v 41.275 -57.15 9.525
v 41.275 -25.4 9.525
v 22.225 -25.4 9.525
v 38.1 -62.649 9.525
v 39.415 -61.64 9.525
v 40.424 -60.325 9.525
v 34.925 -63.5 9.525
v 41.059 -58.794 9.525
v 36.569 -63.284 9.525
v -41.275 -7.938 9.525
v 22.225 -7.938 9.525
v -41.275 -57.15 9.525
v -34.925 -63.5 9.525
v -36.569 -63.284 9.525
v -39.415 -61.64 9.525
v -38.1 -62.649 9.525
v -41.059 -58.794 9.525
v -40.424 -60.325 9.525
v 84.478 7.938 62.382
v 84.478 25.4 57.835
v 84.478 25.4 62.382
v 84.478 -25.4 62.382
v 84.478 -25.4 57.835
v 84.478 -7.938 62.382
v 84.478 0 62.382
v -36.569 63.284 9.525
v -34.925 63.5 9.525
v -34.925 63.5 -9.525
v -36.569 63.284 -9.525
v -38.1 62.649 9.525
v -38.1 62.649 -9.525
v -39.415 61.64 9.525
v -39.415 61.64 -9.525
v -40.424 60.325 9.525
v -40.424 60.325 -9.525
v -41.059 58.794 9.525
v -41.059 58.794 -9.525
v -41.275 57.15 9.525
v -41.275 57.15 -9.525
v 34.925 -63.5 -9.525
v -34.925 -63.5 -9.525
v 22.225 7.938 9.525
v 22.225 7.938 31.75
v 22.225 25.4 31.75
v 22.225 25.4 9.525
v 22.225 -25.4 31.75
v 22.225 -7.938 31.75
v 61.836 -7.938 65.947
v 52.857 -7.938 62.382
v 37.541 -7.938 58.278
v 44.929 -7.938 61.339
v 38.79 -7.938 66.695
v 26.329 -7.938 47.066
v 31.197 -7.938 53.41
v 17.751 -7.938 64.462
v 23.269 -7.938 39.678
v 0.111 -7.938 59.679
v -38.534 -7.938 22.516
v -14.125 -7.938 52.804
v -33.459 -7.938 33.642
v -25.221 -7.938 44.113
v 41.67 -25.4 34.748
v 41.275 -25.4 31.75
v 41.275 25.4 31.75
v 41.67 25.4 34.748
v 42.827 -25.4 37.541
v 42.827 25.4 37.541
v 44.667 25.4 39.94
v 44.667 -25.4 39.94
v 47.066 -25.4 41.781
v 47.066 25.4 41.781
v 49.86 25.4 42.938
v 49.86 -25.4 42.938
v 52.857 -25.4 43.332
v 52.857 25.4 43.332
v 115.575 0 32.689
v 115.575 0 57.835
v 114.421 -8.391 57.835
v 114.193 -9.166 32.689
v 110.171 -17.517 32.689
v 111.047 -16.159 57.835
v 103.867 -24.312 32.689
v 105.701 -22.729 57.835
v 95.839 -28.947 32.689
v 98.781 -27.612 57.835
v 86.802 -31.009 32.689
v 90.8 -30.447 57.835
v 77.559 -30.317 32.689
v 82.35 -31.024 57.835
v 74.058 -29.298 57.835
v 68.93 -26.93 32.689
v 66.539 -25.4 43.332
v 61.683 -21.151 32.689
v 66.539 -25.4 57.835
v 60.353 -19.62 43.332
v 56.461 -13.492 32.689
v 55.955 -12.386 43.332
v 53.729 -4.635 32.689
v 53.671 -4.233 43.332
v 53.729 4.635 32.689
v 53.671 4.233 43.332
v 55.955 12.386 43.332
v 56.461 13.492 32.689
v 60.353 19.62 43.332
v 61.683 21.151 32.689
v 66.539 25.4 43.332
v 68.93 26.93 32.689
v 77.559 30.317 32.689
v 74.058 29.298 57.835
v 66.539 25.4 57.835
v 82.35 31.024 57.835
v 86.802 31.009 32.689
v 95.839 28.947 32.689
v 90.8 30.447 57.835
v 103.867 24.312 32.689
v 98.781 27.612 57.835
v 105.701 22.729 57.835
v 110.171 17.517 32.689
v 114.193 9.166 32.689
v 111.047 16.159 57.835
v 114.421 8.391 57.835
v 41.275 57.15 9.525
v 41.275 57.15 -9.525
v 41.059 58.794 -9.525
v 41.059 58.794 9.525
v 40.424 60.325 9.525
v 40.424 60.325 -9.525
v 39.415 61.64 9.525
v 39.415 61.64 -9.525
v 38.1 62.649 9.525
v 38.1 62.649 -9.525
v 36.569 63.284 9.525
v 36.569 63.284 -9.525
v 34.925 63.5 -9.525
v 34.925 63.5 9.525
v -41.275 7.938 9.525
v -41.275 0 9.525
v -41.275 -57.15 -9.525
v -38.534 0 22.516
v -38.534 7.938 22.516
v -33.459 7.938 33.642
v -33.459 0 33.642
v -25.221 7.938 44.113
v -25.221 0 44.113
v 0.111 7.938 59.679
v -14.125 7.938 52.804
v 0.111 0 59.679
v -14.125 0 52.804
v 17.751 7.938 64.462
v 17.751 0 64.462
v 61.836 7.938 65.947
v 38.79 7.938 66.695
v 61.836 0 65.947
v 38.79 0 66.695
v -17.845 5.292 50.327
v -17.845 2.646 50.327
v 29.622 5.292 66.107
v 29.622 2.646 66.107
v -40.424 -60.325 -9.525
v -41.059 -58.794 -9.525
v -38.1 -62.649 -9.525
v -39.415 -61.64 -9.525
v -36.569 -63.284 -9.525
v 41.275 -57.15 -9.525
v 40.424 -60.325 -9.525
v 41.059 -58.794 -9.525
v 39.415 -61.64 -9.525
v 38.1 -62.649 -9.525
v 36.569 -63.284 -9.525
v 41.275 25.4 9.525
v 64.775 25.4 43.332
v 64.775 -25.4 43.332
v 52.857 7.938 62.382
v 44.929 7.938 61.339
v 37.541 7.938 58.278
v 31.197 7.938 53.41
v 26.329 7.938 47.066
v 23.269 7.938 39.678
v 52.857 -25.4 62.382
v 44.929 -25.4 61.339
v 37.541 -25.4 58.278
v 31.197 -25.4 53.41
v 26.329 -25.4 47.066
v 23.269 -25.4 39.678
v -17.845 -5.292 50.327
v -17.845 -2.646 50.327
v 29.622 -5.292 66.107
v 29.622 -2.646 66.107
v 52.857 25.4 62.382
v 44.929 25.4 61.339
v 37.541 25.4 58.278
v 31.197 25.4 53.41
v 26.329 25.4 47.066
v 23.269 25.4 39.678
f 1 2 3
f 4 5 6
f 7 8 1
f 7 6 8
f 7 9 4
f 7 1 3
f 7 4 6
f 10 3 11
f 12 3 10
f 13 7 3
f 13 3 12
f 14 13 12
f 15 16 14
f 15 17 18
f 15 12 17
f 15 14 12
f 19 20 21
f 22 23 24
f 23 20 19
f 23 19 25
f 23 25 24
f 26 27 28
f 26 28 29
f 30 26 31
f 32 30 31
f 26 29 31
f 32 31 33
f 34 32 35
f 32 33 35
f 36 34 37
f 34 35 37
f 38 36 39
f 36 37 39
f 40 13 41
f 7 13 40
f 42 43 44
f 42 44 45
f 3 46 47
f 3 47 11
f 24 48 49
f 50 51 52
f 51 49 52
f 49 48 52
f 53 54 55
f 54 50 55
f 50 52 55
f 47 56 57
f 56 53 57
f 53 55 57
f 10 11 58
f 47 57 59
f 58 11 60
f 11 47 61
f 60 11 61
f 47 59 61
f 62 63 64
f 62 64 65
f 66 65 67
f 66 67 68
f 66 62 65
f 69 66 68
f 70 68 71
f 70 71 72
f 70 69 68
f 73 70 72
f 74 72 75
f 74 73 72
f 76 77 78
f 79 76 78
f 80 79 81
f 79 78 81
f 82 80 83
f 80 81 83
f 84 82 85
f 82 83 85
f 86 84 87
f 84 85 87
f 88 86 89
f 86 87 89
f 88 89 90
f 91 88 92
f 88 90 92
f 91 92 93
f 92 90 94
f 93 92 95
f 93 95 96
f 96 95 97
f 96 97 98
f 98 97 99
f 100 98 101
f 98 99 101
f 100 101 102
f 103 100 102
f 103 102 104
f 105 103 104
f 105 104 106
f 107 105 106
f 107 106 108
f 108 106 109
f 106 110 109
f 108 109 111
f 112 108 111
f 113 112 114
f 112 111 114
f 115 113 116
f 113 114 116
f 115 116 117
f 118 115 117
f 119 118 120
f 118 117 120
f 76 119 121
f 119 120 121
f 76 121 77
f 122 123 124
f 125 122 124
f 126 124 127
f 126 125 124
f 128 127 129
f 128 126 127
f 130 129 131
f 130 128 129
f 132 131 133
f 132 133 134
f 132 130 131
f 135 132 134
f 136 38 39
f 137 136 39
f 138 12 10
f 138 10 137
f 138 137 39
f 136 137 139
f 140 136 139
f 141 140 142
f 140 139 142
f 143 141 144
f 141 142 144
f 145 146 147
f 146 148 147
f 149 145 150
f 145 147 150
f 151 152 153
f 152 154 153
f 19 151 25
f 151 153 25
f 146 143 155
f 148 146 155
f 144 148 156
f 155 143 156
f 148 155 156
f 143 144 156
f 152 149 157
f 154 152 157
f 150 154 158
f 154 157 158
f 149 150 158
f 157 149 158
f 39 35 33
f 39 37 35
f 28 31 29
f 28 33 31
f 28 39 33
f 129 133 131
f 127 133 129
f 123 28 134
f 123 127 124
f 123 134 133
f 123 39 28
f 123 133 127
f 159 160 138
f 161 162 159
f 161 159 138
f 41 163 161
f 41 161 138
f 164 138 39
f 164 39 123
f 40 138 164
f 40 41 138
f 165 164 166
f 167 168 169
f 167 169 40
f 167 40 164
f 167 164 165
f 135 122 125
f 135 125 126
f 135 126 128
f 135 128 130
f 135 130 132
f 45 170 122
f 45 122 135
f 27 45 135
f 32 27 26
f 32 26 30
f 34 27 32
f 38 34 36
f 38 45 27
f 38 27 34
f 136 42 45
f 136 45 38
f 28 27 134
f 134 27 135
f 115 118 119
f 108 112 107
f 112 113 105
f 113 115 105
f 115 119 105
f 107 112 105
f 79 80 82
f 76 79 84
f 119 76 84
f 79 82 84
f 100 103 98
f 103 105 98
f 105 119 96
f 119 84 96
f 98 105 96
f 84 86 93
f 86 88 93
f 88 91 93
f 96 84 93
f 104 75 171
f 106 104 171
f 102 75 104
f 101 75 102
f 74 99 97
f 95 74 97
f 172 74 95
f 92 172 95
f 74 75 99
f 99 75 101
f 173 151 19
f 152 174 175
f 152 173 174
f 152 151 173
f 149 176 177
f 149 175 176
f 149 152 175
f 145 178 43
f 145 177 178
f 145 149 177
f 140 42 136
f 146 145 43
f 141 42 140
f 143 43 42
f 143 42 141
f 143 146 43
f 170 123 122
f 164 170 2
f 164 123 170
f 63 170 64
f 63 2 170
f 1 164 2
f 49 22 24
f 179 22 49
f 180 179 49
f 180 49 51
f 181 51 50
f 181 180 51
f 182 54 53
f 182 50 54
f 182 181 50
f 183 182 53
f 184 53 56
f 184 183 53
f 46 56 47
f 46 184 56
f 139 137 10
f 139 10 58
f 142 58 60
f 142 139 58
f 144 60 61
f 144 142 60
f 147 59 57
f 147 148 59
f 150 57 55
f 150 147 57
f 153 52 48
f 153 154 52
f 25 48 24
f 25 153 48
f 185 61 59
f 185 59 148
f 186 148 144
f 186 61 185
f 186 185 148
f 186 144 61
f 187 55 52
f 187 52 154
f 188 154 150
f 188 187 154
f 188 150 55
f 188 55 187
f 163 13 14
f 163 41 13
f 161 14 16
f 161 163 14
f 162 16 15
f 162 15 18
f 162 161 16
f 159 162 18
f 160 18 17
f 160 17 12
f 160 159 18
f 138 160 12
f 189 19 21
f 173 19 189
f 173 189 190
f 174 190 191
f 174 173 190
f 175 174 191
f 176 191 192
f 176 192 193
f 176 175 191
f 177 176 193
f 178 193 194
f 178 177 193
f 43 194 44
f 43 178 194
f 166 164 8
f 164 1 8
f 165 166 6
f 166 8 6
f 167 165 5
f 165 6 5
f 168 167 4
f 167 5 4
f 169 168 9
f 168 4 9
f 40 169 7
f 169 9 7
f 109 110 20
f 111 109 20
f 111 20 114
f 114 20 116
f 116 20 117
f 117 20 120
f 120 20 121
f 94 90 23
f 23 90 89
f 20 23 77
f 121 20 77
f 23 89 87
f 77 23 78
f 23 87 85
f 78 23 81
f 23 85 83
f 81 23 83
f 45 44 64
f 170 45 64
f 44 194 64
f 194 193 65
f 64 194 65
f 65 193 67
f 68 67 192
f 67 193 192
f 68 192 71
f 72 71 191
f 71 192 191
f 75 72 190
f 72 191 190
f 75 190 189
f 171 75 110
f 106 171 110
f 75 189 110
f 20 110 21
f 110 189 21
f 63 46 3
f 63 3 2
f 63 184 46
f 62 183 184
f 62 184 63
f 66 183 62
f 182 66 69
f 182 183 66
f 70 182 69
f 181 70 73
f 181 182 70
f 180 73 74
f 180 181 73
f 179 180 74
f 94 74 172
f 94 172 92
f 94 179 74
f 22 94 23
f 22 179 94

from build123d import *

# Parameters (mm, degrees)
F1_DEPTH = 63.5
F0_W     = 19.703557321
F0_H     = 14.5021951942
F2_DEPTH = 25.4
F3_DEPTH = 7.9375
F5_R     = 6.35


with BuildPart() as f1:
    # F0 (on Front) → F1 (new body, symmetric)
    with BuildSketch(Plane.XZ):
        Polygon((-41.275, 9.525), (-41.275, -9.525), (41.275, -9.525), (41.275, 9.525), (22.225, 9.525), align=None)
    extrude(amount=F1_DEPTH, both=True)

    # F0 (on Front) → F2 (join, symmetric)
    with BuildSketch(Plane.XZ):
        with BuildLine():
            Line((22.225, 9.525), (41.275, 9.525))
            Line((41.275, 9.525), (41.275, 31.7500035657))
            ThreePointArc((41.275, 31.7500035657), (44.6674064176, 39.9399971481), (52.8574, 43.3324035657))
            Line((52.8574, 43.3324035657), (64.774647217, 43.3324035657))
            Line((64.774647217, 43.3324035657), (64.774647217, 57.8345987598))
            Line((64.774647217, 57.8345987598), (84.478204538, 57.8345987598))
            Line((84.478204538, 57.8345987598), (84.478204538, 62.3824035657))
            Line((84.478204538, 62.3824035657), (52.8574, 62.3824035657))
            ThreePointArc((52.8574, 62.3824035657), (31.197022236, 53.4103813297), (22.225, 31.7500035657))
            Line((22.225, 31.7500035657), (22.225, 9.525))
        make_face()
        with Locations((74.6264258775, 50.5835011627)):
            Rectangle(F0_W, F0_H)
    extrude(amount=F2_DEPTH, both=True)

    # F0 (on Front) → F3 (join, symmetric)
    with BuildSketch(Plane.XZ):
        with BuildLine():
            add(Edge.make_bspline(
                [(-41.275, 9.525), (-35.4120545089, 64.6761879325), (31.4773879945, 74.0210413933), (84.478204538, 62.3824035657)],
                knots=[0, 0, 0, 0, 136.4103132585, 136.4103132585, 136.4103132585, 136.4103132585], degree=3))
            Line((-41.275, 9.525), (22.225, 9.525))
            Line((22.225, 9.525), (22.225, 31.7500035657))
            ThreePointArc((22.225, 31.7500035657), (31.197022236, 53.4103813297), (52.8574, 62.3824035657))
            Line((52.8574, 62.3824035657), (84.478204538, 62.3824035657))
        make_face()
    extrude(amount=F3_DEPTH, both=True)

    # F0 (on Front) → F4 (revolve)
    with BuildSketch(Plane.XZ):
        Polygon((115.574647217, 57.8345987598), (84.478204538, 57.8345987598), (84.478204538, 43.3324035657), (84.478204538, 32.6885987598), (115.574647217, 32.6885987598), align=None)
    revolve(axis=Axis((84.478204538, 0, 47.5355011627), (0, 0, -1)))

    # F5
    f5_edges = [f1.edges().sort_by_distance(p)[0] for p in [
        (41.275, -63.5, 0),
        (-41.275, -63.5, 0),
        (-41.275, 63.5, 0),
        (41.275, 63.5, 0),
    ]]
    fillet(f5_edges, radius=F5_R)


solid = f1.part
